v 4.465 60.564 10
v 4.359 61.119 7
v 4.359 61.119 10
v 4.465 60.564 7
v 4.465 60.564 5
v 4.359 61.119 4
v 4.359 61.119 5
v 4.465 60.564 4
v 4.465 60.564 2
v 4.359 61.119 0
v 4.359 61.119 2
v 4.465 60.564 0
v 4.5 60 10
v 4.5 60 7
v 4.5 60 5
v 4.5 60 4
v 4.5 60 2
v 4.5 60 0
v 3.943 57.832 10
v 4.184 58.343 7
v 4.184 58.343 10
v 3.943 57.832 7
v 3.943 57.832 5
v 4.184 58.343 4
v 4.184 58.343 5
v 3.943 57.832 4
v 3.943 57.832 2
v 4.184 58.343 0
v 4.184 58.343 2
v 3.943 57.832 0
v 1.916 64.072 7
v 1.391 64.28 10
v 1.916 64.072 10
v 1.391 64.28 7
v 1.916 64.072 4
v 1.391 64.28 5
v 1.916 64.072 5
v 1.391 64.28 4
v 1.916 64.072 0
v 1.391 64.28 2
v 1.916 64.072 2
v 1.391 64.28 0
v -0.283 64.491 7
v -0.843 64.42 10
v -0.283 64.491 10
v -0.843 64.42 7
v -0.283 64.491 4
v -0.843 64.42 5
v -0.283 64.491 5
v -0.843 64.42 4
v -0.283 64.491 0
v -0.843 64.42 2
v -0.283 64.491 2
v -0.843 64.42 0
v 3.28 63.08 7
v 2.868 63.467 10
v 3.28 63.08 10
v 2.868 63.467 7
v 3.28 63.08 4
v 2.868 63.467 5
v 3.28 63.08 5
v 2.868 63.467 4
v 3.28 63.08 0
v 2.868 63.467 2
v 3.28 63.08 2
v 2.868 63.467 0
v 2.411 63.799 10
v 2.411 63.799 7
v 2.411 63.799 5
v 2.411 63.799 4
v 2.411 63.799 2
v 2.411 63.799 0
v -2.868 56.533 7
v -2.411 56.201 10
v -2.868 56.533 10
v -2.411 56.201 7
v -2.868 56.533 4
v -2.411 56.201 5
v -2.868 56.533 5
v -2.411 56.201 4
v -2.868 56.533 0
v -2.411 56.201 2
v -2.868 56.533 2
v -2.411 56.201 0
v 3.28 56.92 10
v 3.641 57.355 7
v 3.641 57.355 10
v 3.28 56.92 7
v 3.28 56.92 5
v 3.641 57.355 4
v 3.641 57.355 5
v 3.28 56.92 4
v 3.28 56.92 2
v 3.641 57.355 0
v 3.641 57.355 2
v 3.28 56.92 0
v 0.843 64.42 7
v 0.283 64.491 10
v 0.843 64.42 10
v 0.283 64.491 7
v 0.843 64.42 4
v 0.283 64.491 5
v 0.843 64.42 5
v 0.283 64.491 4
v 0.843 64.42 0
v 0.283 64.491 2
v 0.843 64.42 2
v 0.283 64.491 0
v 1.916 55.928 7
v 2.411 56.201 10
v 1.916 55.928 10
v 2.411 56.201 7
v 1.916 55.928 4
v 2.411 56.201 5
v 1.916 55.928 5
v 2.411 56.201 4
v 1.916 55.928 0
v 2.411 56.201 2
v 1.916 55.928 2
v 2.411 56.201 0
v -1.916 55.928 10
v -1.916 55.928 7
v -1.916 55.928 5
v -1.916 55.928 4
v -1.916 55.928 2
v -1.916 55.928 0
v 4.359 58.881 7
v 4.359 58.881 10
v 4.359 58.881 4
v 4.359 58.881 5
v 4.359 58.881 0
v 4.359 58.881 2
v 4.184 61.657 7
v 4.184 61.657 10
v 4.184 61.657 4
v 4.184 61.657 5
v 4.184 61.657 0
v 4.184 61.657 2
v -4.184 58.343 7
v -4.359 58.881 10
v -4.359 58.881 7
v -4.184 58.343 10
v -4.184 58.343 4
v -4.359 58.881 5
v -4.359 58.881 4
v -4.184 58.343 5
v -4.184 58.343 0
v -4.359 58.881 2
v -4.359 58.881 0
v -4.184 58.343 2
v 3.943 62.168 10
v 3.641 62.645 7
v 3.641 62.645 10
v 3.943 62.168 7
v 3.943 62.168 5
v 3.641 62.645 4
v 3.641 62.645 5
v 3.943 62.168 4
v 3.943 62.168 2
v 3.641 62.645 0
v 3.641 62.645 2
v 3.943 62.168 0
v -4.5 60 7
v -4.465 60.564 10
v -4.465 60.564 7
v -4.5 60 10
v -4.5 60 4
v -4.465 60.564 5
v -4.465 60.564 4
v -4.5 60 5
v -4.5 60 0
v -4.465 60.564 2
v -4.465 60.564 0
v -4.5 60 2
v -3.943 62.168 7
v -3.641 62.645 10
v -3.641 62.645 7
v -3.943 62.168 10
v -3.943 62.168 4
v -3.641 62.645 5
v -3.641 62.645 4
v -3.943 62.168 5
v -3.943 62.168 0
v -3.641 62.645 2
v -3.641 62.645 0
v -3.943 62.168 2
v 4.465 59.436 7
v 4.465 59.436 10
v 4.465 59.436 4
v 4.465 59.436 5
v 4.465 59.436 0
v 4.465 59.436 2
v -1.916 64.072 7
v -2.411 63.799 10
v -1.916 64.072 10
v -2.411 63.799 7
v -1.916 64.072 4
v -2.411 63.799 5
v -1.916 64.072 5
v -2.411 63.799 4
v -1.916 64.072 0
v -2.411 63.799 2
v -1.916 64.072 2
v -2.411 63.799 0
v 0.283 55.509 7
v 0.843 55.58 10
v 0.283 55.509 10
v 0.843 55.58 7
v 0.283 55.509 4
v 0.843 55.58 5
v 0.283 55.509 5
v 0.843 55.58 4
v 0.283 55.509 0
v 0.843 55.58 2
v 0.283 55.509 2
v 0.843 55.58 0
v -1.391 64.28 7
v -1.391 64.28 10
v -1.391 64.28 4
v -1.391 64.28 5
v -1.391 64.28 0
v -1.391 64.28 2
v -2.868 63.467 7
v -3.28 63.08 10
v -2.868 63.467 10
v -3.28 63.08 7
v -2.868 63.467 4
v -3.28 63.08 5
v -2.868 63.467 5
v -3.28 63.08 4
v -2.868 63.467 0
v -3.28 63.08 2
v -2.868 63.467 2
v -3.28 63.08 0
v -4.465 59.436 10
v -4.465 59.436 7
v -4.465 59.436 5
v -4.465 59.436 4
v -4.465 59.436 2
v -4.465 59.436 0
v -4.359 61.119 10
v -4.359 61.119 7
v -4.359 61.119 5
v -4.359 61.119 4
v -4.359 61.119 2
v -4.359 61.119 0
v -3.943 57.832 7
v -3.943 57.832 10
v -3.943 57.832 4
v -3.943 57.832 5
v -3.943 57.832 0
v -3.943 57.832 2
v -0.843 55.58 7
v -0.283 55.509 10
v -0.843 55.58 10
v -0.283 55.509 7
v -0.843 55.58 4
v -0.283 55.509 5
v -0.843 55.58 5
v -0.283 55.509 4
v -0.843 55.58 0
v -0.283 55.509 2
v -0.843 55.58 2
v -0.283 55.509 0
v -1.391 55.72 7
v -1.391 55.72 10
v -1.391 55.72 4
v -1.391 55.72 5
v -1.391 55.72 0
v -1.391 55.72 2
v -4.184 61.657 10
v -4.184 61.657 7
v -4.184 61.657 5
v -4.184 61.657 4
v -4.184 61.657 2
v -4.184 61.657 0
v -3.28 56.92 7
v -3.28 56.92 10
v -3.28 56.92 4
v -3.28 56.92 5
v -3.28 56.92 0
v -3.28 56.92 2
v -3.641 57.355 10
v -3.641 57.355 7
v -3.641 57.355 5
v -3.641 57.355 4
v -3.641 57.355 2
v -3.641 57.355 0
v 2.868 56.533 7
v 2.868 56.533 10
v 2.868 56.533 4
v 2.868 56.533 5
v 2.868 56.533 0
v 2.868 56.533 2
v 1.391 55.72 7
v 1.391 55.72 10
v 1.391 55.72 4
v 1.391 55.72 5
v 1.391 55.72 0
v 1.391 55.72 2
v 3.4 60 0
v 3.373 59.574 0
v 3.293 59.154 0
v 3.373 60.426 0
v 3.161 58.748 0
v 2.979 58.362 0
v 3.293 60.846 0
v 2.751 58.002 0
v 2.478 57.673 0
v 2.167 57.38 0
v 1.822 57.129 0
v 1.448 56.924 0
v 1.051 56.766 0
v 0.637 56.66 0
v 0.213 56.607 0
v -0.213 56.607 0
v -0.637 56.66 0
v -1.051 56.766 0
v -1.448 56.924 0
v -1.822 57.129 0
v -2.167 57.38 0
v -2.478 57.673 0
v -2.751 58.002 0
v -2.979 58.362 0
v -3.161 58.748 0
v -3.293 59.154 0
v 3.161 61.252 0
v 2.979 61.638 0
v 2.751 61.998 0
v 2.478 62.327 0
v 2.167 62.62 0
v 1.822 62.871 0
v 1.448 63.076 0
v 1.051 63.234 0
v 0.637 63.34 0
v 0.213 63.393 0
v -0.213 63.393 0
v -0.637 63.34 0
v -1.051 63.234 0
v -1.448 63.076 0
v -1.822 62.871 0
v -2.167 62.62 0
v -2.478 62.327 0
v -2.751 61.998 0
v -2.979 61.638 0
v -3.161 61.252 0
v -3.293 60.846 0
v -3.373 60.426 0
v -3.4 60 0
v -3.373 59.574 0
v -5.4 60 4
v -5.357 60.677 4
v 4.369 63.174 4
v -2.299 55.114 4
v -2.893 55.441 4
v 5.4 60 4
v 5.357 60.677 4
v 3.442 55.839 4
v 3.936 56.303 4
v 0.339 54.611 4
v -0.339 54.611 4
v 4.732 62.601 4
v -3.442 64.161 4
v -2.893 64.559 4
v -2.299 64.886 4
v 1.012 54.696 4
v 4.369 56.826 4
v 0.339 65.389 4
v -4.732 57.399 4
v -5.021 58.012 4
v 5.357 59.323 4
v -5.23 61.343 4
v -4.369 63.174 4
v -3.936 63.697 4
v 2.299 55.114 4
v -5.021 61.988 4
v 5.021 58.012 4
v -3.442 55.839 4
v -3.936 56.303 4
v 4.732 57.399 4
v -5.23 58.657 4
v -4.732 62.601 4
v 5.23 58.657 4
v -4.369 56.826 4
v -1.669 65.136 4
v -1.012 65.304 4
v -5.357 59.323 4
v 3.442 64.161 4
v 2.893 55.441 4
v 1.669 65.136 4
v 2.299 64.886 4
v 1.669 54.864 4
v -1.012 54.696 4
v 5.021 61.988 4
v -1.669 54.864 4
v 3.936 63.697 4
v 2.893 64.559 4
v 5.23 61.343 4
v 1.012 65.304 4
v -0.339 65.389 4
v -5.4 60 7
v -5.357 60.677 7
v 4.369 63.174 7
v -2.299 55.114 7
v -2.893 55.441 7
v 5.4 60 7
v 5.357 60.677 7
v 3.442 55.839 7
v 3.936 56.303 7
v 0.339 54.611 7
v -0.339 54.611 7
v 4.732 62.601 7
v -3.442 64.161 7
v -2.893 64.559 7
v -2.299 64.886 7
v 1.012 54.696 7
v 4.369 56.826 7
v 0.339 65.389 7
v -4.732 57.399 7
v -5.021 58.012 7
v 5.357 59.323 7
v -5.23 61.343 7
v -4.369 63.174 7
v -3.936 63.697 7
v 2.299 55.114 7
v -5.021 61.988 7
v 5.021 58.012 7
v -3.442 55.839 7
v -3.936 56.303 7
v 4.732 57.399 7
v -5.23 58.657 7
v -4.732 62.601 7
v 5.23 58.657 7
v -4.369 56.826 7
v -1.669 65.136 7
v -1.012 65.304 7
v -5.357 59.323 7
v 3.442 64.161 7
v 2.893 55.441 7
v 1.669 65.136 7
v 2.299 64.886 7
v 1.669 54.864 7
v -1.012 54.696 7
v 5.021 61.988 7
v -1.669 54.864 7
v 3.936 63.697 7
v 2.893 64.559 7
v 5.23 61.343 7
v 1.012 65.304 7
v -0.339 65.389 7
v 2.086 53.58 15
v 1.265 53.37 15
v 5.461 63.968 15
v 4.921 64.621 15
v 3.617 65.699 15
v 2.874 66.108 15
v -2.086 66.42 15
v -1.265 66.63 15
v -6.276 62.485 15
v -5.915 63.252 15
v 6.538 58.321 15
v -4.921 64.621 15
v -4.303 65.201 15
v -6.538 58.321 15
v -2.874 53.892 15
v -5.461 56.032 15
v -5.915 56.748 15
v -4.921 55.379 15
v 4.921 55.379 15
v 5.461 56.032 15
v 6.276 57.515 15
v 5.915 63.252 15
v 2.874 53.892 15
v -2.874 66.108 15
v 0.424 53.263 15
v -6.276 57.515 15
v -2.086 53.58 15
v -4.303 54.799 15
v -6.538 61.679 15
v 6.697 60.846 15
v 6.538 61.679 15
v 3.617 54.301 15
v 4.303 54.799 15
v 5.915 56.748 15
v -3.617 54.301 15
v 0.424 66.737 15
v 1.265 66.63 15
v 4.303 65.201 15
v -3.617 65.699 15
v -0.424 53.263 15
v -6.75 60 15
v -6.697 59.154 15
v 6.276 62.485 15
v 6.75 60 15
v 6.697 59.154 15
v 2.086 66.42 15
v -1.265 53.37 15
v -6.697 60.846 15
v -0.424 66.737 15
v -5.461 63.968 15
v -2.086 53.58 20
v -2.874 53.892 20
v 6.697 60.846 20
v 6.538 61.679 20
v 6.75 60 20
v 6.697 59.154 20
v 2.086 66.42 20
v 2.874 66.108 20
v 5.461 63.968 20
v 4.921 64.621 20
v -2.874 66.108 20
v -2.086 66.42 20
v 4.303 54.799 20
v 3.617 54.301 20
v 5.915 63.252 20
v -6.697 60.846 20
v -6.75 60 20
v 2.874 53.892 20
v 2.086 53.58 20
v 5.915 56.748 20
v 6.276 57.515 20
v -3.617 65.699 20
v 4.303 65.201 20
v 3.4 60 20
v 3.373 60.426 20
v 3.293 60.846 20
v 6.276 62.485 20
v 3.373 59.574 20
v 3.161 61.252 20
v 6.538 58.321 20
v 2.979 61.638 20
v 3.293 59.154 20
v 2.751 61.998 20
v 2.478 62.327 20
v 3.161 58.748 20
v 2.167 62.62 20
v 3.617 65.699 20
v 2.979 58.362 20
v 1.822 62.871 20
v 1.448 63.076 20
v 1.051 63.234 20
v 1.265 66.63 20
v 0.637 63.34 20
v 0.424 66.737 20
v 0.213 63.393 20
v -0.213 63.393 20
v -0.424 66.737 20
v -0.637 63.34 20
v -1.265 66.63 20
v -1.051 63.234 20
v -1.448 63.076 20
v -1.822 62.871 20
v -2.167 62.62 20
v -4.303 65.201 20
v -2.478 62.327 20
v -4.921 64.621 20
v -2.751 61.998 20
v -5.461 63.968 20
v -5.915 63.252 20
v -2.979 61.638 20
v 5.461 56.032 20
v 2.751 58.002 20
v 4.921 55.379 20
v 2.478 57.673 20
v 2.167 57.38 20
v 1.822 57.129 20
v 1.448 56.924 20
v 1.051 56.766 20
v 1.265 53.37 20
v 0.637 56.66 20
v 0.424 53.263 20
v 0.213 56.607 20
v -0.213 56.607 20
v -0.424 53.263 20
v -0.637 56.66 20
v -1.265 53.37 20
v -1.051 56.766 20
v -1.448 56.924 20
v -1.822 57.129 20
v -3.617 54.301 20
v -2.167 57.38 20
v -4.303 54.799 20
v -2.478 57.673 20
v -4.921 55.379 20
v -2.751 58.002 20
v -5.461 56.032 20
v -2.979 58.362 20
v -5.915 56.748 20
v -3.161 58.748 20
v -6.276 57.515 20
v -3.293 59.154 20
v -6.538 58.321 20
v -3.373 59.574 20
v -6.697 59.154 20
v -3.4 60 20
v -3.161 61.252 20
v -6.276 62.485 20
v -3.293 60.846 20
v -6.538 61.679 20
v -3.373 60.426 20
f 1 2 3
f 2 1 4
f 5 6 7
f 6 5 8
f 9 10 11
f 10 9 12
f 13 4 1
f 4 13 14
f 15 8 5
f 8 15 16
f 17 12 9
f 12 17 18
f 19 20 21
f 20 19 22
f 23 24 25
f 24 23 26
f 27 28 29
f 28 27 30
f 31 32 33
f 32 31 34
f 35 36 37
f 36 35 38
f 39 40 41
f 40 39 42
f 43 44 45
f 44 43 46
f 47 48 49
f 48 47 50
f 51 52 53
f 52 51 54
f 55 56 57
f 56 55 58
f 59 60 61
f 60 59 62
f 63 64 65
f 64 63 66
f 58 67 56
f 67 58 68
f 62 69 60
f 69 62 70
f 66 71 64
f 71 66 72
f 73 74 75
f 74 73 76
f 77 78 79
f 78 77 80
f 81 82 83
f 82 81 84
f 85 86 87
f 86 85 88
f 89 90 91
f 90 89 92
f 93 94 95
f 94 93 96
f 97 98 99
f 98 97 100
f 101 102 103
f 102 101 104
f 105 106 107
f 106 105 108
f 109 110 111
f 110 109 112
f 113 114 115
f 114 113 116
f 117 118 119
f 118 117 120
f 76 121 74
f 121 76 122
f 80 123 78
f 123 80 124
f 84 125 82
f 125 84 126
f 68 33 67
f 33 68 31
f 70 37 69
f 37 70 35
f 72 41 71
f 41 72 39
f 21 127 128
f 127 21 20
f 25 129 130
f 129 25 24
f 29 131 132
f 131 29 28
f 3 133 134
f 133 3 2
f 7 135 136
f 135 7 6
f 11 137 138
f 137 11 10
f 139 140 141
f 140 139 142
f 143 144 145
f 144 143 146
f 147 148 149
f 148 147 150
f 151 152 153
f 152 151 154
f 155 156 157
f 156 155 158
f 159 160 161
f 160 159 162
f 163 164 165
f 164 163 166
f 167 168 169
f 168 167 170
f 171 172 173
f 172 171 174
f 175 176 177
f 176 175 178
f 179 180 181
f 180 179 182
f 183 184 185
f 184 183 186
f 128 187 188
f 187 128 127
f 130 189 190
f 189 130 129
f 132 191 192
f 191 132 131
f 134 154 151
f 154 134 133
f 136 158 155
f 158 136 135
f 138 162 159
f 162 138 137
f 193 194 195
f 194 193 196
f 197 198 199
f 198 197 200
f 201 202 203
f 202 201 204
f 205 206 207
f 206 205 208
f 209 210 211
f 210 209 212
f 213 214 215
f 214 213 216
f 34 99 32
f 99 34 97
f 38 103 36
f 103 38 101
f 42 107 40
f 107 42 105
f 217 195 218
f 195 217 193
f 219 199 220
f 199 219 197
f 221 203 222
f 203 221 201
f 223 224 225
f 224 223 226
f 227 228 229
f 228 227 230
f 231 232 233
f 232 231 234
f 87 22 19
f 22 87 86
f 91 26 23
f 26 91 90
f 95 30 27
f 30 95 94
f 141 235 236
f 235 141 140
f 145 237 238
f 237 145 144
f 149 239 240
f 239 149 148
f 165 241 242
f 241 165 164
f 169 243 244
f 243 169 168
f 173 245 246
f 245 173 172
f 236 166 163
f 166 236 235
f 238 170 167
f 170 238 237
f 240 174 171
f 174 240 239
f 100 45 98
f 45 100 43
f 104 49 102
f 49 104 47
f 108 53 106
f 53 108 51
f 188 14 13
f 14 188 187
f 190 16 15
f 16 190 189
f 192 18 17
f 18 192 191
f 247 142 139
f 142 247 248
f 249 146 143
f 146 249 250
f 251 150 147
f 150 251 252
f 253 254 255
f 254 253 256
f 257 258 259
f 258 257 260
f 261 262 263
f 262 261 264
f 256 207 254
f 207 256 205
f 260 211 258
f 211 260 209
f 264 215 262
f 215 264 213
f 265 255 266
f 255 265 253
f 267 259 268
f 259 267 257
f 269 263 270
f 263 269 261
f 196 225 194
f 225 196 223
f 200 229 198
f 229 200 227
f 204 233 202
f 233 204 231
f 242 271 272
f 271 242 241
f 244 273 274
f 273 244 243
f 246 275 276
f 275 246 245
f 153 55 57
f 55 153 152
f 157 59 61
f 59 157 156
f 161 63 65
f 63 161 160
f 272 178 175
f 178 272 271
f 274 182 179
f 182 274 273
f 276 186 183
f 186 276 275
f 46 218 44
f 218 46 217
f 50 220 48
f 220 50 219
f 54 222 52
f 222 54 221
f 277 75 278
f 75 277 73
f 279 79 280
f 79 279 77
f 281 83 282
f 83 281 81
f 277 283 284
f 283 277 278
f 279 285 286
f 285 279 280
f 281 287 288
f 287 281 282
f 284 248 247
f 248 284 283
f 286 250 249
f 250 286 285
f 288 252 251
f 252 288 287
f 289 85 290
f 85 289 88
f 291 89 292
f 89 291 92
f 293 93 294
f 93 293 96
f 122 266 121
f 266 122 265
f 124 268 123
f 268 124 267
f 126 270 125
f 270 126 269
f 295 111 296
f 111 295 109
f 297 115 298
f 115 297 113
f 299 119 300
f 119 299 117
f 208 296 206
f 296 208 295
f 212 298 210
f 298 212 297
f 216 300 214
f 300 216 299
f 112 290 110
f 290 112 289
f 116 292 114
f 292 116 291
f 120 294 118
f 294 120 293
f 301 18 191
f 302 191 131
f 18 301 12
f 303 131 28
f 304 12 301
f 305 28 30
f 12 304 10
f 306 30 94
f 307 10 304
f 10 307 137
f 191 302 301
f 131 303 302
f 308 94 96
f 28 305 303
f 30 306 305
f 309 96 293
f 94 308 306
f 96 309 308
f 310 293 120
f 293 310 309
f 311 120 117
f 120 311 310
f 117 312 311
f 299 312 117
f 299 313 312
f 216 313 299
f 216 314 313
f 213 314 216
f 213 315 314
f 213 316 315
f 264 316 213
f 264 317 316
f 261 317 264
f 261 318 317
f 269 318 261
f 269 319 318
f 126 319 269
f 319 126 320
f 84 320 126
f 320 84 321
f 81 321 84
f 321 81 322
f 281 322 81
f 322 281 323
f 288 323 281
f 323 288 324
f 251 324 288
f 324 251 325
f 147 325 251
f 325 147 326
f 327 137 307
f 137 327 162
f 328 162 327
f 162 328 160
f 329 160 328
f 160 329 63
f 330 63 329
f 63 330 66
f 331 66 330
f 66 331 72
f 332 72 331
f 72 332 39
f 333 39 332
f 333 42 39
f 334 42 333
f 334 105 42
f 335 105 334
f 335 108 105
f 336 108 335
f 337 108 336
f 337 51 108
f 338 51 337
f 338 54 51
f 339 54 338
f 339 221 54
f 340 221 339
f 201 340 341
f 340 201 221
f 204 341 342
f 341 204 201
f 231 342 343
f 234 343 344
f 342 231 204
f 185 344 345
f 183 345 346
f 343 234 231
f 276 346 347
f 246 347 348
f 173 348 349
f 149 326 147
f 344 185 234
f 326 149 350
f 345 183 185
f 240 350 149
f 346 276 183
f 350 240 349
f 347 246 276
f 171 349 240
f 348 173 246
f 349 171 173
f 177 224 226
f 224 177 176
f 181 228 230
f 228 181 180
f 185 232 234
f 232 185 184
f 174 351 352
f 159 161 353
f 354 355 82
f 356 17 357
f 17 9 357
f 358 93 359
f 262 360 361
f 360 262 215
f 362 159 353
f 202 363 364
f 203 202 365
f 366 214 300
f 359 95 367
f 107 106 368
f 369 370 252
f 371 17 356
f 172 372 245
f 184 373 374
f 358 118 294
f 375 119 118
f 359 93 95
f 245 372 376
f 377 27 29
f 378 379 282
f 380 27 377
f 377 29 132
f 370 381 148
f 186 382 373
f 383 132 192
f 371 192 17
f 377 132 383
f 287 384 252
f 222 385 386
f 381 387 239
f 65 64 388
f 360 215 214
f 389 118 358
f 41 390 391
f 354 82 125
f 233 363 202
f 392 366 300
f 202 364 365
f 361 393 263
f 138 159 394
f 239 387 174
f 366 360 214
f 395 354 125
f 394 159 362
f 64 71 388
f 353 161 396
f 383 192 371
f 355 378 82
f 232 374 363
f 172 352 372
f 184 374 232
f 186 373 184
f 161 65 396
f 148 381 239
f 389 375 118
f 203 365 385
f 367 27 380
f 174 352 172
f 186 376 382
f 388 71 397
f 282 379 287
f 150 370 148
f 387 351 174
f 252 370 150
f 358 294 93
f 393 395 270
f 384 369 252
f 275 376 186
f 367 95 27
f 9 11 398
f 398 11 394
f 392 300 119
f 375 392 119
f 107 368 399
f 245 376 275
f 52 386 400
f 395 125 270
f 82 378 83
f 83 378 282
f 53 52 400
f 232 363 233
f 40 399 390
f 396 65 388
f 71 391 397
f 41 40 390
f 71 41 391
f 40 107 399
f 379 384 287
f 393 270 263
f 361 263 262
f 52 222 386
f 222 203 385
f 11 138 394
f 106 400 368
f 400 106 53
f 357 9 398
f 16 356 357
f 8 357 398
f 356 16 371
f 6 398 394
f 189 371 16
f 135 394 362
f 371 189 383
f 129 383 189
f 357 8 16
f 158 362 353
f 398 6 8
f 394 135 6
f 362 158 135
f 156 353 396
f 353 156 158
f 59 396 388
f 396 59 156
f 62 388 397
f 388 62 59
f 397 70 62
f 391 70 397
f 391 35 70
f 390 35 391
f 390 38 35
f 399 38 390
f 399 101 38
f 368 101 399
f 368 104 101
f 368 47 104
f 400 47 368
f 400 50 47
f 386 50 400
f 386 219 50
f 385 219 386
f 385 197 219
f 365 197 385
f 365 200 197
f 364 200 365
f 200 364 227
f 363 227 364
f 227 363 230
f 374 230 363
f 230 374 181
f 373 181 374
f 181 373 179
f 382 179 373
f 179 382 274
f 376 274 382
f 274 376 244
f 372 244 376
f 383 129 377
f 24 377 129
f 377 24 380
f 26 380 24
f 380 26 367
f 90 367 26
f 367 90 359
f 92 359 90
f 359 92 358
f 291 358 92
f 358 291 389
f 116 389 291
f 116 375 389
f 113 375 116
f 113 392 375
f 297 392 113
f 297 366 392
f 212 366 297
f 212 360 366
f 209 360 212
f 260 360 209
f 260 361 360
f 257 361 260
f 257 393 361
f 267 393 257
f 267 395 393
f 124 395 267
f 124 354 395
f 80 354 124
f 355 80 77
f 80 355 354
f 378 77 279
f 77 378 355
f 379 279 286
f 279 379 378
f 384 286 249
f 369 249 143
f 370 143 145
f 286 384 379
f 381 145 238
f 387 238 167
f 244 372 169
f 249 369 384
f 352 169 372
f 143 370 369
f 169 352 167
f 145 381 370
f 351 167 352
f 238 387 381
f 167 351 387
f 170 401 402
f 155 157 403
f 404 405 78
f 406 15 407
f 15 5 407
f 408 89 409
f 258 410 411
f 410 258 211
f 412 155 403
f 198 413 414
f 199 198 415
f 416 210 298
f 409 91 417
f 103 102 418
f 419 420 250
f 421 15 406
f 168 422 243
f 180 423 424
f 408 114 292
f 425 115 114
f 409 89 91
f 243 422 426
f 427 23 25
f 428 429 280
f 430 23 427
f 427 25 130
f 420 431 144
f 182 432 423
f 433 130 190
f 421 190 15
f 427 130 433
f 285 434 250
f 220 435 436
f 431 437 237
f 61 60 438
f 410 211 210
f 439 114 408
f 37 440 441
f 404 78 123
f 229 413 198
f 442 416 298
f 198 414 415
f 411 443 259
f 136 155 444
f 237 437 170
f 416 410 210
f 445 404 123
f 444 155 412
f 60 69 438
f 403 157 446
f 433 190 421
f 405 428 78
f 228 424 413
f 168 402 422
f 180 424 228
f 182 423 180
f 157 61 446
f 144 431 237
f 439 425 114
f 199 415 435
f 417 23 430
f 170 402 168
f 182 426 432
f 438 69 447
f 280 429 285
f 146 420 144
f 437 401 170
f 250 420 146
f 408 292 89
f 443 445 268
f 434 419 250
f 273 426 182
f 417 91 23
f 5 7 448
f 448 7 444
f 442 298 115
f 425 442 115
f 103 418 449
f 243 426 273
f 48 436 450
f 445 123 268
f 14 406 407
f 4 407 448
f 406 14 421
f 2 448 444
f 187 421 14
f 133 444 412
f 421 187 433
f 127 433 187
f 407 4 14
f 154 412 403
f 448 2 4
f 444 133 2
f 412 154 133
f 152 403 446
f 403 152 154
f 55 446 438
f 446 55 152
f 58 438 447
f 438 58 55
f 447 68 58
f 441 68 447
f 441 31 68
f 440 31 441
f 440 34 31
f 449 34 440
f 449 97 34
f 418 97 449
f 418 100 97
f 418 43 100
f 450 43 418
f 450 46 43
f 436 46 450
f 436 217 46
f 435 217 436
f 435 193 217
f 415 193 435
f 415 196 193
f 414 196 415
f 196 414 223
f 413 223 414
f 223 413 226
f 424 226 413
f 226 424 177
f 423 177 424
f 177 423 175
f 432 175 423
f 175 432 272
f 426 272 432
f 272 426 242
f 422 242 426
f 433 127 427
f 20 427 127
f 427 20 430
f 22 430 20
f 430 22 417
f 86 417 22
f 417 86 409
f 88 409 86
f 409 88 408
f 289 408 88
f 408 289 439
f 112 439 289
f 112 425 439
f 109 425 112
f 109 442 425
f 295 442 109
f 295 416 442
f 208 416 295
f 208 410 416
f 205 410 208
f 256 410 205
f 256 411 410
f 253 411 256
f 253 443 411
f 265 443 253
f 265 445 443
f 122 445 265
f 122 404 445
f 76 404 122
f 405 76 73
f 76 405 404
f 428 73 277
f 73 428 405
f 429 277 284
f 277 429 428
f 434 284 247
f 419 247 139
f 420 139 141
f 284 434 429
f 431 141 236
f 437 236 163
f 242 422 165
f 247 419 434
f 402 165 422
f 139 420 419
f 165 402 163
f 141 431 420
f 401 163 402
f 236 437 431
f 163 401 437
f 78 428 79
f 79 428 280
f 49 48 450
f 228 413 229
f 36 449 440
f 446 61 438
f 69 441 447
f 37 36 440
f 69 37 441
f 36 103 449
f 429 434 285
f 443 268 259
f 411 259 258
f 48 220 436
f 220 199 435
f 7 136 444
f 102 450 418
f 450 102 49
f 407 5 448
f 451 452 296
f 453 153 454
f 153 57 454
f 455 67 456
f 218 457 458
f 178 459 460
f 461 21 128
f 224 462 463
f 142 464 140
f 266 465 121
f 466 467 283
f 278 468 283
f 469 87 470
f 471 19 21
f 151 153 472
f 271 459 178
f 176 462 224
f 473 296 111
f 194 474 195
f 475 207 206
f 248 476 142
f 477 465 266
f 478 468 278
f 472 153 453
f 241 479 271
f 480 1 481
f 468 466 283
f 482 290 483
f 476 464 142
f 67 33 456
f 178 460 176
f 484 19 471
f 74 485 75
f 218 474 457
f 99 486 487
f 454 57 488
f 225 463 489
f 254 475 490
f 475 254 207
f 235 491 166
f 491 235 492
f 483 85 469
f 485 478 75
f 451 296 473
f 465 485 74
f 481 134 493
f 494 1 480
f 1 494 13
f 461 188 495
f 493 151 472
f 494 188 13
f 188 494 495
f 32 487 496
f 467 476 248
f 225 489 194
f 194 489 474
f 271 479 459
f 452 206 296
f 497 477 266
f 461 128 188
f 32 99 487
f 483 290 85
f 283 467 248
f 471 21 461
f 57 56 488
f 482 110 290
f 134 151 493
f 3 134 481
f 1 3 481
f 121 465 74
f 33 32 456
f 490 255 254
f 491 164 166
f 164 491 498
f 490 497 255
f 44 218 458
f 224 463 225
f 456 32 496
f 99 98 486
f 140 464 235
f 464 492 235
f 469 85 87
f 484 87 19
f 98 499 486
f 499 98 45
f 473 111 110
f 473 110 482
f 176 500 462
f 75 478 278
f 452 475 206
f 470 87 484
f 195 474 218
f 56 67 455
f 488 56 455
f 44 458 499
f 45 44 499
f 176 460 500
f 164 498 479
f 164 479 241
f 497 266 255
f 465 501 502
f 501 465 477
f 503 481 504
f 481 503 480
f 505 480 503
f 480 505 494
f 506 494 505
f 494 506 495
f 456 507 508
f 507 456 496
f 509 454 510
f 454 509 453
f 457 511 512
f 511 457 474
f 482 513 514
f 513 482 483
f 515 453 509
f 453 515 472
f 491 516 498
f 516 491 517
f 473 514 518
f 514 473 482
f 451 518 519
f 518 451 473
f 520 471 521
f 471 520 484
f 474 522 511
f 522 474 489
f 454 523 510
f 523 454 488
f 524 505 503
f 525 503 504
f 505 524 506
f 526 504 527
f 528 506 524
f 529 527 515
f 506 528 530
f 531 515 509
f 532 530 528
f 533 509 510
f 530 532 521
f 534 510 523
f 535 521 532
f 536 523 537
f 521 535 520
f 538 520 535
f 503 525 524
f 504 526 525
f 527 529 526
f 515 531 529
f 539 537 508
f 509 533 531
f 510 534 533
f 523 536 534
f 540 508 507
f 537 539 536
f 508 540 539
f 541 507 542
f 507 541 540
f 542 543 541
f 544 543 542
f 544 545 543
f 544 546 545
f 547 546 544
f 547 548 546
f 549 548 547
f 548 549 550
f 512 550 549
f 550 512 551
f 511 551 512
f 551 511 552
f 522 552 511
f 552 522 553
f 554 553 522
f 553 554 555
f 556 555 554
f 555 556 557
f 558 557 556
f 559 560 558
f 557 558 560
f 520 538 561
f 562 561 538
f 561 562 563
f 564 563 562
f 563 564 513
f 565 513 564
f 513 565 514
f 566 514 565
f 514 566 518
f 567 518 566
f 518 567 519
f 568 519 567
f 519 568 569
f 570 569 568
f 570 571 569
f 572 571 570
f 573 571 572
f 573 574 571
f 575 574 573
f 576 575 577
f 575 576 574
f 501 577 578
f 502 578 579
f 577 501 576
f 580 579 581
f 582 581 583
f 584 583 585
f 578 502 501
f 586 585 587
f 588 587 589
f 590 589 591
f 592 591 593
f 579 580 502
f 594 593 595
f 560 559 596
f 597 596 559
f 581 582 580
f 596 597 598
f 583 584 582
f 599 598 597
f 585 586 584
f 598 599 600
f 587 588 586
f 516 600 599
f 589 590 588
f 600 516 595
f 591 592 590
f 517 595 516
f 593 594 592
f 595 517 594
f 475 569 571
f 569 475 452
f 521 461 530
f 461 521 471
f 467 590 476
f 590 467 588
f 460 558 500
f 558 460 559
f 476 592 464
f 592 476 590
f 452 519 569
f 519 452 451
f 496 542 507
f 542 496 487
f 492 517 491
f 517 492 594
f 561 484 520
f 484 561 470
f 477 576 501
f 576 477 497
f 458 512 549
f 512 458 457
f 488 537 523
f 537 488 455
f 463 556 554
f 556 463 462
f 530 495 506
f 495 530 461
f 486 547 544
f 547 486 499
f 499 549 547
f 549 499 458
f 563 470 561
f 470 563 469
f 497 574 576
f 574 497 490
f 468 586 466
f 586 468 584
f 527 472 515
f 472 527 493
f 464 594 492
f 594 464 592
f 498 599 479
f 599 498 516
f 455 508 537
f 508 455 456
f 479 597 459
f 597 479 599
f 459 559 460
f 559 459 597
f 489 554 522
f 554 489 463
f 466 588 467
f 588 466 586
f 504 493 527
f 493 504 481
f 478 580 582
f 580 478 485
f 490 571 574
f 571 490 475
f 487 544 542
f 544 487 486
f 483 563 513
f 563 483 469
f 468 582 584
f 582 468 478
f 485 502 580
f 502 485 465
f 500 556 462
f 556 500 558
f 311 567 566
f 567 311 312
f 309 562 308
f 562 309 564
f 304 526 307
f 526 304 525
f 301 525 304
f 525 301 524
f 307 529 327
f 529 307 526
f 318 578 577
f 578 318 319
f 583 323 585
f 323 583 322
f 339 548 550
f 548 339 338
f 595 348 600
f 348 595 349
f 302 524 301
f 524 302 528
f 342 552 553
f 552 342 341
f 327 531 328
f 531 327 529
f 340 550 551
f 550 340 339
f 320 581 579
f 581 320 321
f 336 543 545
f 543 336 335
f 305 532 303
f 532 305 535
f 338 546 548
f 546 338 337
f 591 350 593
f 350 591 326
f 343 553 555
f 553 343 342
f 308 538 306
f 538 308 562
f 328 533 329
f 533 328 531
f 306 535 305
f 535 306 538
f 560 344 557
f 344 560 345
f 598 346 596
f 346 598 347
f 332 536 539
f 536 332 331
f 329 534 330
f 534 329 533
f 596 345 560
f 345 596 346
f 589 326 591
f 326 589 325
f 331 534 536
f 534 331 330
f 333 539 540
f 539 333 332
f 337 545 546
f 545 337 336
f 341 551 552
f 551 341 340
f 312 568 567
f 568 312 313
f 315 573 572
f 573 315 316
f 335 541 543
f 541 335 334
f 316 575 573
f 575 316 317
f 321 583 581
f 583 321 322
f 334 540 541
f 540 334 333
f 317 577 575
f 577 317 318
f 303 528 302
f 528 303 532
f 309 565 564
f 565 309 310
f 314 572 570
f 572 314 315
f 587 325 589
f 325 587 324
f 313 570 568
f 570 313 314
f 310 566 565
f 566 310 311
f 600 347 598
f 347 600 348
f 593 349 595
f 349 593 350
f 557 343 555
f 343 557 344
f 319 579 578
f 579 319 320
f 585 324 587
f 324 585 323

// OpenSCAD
//translate([0,0,0]) adaptor();
//translate([0,30,0]) adaptor(3.2, 5.2, 4.5);
translate([0,60,0]) adaptor(3.4, 5.4, 4.5);
//translate([0,90,0]) adaptor(3.6, 5.6, 4.6);


resolution = 50;

module adaptor(r_inside=2.75, r_flange=5.1, r_insert=4.25) {

nval = ceil((r_insert*1.5-r_insert)*2);

echo("nval:", nval);

difference() {
union() {
	cylinder(r=r_insert, h=10, $fn=resolution);
	translate([0,0,2]) cylinder(r1=r_insert, r2=r_flange, h=2, $fn=resolution);
	//translate([0,0,4]) cylinder(r1=r_insert, r2=r_flange, h=2, $fn=resolution);
	translate([0,0,5]) cylinder(r1=r_insert, r2=r_flange, h=2, $fn=resolution);
	translate([0,0,10]) cylinder(r1=r_insert, r2=r_insert*1.5, h=nval, $fn=resolution);
	translate([0,0,10+nval]) cylinder(r=r_insert*1.5, h=5, $fn=resolution);

}
translate([0,0,-1]) cylinder(r=r_inside, h=40+nval, $fn=50);
}

}
